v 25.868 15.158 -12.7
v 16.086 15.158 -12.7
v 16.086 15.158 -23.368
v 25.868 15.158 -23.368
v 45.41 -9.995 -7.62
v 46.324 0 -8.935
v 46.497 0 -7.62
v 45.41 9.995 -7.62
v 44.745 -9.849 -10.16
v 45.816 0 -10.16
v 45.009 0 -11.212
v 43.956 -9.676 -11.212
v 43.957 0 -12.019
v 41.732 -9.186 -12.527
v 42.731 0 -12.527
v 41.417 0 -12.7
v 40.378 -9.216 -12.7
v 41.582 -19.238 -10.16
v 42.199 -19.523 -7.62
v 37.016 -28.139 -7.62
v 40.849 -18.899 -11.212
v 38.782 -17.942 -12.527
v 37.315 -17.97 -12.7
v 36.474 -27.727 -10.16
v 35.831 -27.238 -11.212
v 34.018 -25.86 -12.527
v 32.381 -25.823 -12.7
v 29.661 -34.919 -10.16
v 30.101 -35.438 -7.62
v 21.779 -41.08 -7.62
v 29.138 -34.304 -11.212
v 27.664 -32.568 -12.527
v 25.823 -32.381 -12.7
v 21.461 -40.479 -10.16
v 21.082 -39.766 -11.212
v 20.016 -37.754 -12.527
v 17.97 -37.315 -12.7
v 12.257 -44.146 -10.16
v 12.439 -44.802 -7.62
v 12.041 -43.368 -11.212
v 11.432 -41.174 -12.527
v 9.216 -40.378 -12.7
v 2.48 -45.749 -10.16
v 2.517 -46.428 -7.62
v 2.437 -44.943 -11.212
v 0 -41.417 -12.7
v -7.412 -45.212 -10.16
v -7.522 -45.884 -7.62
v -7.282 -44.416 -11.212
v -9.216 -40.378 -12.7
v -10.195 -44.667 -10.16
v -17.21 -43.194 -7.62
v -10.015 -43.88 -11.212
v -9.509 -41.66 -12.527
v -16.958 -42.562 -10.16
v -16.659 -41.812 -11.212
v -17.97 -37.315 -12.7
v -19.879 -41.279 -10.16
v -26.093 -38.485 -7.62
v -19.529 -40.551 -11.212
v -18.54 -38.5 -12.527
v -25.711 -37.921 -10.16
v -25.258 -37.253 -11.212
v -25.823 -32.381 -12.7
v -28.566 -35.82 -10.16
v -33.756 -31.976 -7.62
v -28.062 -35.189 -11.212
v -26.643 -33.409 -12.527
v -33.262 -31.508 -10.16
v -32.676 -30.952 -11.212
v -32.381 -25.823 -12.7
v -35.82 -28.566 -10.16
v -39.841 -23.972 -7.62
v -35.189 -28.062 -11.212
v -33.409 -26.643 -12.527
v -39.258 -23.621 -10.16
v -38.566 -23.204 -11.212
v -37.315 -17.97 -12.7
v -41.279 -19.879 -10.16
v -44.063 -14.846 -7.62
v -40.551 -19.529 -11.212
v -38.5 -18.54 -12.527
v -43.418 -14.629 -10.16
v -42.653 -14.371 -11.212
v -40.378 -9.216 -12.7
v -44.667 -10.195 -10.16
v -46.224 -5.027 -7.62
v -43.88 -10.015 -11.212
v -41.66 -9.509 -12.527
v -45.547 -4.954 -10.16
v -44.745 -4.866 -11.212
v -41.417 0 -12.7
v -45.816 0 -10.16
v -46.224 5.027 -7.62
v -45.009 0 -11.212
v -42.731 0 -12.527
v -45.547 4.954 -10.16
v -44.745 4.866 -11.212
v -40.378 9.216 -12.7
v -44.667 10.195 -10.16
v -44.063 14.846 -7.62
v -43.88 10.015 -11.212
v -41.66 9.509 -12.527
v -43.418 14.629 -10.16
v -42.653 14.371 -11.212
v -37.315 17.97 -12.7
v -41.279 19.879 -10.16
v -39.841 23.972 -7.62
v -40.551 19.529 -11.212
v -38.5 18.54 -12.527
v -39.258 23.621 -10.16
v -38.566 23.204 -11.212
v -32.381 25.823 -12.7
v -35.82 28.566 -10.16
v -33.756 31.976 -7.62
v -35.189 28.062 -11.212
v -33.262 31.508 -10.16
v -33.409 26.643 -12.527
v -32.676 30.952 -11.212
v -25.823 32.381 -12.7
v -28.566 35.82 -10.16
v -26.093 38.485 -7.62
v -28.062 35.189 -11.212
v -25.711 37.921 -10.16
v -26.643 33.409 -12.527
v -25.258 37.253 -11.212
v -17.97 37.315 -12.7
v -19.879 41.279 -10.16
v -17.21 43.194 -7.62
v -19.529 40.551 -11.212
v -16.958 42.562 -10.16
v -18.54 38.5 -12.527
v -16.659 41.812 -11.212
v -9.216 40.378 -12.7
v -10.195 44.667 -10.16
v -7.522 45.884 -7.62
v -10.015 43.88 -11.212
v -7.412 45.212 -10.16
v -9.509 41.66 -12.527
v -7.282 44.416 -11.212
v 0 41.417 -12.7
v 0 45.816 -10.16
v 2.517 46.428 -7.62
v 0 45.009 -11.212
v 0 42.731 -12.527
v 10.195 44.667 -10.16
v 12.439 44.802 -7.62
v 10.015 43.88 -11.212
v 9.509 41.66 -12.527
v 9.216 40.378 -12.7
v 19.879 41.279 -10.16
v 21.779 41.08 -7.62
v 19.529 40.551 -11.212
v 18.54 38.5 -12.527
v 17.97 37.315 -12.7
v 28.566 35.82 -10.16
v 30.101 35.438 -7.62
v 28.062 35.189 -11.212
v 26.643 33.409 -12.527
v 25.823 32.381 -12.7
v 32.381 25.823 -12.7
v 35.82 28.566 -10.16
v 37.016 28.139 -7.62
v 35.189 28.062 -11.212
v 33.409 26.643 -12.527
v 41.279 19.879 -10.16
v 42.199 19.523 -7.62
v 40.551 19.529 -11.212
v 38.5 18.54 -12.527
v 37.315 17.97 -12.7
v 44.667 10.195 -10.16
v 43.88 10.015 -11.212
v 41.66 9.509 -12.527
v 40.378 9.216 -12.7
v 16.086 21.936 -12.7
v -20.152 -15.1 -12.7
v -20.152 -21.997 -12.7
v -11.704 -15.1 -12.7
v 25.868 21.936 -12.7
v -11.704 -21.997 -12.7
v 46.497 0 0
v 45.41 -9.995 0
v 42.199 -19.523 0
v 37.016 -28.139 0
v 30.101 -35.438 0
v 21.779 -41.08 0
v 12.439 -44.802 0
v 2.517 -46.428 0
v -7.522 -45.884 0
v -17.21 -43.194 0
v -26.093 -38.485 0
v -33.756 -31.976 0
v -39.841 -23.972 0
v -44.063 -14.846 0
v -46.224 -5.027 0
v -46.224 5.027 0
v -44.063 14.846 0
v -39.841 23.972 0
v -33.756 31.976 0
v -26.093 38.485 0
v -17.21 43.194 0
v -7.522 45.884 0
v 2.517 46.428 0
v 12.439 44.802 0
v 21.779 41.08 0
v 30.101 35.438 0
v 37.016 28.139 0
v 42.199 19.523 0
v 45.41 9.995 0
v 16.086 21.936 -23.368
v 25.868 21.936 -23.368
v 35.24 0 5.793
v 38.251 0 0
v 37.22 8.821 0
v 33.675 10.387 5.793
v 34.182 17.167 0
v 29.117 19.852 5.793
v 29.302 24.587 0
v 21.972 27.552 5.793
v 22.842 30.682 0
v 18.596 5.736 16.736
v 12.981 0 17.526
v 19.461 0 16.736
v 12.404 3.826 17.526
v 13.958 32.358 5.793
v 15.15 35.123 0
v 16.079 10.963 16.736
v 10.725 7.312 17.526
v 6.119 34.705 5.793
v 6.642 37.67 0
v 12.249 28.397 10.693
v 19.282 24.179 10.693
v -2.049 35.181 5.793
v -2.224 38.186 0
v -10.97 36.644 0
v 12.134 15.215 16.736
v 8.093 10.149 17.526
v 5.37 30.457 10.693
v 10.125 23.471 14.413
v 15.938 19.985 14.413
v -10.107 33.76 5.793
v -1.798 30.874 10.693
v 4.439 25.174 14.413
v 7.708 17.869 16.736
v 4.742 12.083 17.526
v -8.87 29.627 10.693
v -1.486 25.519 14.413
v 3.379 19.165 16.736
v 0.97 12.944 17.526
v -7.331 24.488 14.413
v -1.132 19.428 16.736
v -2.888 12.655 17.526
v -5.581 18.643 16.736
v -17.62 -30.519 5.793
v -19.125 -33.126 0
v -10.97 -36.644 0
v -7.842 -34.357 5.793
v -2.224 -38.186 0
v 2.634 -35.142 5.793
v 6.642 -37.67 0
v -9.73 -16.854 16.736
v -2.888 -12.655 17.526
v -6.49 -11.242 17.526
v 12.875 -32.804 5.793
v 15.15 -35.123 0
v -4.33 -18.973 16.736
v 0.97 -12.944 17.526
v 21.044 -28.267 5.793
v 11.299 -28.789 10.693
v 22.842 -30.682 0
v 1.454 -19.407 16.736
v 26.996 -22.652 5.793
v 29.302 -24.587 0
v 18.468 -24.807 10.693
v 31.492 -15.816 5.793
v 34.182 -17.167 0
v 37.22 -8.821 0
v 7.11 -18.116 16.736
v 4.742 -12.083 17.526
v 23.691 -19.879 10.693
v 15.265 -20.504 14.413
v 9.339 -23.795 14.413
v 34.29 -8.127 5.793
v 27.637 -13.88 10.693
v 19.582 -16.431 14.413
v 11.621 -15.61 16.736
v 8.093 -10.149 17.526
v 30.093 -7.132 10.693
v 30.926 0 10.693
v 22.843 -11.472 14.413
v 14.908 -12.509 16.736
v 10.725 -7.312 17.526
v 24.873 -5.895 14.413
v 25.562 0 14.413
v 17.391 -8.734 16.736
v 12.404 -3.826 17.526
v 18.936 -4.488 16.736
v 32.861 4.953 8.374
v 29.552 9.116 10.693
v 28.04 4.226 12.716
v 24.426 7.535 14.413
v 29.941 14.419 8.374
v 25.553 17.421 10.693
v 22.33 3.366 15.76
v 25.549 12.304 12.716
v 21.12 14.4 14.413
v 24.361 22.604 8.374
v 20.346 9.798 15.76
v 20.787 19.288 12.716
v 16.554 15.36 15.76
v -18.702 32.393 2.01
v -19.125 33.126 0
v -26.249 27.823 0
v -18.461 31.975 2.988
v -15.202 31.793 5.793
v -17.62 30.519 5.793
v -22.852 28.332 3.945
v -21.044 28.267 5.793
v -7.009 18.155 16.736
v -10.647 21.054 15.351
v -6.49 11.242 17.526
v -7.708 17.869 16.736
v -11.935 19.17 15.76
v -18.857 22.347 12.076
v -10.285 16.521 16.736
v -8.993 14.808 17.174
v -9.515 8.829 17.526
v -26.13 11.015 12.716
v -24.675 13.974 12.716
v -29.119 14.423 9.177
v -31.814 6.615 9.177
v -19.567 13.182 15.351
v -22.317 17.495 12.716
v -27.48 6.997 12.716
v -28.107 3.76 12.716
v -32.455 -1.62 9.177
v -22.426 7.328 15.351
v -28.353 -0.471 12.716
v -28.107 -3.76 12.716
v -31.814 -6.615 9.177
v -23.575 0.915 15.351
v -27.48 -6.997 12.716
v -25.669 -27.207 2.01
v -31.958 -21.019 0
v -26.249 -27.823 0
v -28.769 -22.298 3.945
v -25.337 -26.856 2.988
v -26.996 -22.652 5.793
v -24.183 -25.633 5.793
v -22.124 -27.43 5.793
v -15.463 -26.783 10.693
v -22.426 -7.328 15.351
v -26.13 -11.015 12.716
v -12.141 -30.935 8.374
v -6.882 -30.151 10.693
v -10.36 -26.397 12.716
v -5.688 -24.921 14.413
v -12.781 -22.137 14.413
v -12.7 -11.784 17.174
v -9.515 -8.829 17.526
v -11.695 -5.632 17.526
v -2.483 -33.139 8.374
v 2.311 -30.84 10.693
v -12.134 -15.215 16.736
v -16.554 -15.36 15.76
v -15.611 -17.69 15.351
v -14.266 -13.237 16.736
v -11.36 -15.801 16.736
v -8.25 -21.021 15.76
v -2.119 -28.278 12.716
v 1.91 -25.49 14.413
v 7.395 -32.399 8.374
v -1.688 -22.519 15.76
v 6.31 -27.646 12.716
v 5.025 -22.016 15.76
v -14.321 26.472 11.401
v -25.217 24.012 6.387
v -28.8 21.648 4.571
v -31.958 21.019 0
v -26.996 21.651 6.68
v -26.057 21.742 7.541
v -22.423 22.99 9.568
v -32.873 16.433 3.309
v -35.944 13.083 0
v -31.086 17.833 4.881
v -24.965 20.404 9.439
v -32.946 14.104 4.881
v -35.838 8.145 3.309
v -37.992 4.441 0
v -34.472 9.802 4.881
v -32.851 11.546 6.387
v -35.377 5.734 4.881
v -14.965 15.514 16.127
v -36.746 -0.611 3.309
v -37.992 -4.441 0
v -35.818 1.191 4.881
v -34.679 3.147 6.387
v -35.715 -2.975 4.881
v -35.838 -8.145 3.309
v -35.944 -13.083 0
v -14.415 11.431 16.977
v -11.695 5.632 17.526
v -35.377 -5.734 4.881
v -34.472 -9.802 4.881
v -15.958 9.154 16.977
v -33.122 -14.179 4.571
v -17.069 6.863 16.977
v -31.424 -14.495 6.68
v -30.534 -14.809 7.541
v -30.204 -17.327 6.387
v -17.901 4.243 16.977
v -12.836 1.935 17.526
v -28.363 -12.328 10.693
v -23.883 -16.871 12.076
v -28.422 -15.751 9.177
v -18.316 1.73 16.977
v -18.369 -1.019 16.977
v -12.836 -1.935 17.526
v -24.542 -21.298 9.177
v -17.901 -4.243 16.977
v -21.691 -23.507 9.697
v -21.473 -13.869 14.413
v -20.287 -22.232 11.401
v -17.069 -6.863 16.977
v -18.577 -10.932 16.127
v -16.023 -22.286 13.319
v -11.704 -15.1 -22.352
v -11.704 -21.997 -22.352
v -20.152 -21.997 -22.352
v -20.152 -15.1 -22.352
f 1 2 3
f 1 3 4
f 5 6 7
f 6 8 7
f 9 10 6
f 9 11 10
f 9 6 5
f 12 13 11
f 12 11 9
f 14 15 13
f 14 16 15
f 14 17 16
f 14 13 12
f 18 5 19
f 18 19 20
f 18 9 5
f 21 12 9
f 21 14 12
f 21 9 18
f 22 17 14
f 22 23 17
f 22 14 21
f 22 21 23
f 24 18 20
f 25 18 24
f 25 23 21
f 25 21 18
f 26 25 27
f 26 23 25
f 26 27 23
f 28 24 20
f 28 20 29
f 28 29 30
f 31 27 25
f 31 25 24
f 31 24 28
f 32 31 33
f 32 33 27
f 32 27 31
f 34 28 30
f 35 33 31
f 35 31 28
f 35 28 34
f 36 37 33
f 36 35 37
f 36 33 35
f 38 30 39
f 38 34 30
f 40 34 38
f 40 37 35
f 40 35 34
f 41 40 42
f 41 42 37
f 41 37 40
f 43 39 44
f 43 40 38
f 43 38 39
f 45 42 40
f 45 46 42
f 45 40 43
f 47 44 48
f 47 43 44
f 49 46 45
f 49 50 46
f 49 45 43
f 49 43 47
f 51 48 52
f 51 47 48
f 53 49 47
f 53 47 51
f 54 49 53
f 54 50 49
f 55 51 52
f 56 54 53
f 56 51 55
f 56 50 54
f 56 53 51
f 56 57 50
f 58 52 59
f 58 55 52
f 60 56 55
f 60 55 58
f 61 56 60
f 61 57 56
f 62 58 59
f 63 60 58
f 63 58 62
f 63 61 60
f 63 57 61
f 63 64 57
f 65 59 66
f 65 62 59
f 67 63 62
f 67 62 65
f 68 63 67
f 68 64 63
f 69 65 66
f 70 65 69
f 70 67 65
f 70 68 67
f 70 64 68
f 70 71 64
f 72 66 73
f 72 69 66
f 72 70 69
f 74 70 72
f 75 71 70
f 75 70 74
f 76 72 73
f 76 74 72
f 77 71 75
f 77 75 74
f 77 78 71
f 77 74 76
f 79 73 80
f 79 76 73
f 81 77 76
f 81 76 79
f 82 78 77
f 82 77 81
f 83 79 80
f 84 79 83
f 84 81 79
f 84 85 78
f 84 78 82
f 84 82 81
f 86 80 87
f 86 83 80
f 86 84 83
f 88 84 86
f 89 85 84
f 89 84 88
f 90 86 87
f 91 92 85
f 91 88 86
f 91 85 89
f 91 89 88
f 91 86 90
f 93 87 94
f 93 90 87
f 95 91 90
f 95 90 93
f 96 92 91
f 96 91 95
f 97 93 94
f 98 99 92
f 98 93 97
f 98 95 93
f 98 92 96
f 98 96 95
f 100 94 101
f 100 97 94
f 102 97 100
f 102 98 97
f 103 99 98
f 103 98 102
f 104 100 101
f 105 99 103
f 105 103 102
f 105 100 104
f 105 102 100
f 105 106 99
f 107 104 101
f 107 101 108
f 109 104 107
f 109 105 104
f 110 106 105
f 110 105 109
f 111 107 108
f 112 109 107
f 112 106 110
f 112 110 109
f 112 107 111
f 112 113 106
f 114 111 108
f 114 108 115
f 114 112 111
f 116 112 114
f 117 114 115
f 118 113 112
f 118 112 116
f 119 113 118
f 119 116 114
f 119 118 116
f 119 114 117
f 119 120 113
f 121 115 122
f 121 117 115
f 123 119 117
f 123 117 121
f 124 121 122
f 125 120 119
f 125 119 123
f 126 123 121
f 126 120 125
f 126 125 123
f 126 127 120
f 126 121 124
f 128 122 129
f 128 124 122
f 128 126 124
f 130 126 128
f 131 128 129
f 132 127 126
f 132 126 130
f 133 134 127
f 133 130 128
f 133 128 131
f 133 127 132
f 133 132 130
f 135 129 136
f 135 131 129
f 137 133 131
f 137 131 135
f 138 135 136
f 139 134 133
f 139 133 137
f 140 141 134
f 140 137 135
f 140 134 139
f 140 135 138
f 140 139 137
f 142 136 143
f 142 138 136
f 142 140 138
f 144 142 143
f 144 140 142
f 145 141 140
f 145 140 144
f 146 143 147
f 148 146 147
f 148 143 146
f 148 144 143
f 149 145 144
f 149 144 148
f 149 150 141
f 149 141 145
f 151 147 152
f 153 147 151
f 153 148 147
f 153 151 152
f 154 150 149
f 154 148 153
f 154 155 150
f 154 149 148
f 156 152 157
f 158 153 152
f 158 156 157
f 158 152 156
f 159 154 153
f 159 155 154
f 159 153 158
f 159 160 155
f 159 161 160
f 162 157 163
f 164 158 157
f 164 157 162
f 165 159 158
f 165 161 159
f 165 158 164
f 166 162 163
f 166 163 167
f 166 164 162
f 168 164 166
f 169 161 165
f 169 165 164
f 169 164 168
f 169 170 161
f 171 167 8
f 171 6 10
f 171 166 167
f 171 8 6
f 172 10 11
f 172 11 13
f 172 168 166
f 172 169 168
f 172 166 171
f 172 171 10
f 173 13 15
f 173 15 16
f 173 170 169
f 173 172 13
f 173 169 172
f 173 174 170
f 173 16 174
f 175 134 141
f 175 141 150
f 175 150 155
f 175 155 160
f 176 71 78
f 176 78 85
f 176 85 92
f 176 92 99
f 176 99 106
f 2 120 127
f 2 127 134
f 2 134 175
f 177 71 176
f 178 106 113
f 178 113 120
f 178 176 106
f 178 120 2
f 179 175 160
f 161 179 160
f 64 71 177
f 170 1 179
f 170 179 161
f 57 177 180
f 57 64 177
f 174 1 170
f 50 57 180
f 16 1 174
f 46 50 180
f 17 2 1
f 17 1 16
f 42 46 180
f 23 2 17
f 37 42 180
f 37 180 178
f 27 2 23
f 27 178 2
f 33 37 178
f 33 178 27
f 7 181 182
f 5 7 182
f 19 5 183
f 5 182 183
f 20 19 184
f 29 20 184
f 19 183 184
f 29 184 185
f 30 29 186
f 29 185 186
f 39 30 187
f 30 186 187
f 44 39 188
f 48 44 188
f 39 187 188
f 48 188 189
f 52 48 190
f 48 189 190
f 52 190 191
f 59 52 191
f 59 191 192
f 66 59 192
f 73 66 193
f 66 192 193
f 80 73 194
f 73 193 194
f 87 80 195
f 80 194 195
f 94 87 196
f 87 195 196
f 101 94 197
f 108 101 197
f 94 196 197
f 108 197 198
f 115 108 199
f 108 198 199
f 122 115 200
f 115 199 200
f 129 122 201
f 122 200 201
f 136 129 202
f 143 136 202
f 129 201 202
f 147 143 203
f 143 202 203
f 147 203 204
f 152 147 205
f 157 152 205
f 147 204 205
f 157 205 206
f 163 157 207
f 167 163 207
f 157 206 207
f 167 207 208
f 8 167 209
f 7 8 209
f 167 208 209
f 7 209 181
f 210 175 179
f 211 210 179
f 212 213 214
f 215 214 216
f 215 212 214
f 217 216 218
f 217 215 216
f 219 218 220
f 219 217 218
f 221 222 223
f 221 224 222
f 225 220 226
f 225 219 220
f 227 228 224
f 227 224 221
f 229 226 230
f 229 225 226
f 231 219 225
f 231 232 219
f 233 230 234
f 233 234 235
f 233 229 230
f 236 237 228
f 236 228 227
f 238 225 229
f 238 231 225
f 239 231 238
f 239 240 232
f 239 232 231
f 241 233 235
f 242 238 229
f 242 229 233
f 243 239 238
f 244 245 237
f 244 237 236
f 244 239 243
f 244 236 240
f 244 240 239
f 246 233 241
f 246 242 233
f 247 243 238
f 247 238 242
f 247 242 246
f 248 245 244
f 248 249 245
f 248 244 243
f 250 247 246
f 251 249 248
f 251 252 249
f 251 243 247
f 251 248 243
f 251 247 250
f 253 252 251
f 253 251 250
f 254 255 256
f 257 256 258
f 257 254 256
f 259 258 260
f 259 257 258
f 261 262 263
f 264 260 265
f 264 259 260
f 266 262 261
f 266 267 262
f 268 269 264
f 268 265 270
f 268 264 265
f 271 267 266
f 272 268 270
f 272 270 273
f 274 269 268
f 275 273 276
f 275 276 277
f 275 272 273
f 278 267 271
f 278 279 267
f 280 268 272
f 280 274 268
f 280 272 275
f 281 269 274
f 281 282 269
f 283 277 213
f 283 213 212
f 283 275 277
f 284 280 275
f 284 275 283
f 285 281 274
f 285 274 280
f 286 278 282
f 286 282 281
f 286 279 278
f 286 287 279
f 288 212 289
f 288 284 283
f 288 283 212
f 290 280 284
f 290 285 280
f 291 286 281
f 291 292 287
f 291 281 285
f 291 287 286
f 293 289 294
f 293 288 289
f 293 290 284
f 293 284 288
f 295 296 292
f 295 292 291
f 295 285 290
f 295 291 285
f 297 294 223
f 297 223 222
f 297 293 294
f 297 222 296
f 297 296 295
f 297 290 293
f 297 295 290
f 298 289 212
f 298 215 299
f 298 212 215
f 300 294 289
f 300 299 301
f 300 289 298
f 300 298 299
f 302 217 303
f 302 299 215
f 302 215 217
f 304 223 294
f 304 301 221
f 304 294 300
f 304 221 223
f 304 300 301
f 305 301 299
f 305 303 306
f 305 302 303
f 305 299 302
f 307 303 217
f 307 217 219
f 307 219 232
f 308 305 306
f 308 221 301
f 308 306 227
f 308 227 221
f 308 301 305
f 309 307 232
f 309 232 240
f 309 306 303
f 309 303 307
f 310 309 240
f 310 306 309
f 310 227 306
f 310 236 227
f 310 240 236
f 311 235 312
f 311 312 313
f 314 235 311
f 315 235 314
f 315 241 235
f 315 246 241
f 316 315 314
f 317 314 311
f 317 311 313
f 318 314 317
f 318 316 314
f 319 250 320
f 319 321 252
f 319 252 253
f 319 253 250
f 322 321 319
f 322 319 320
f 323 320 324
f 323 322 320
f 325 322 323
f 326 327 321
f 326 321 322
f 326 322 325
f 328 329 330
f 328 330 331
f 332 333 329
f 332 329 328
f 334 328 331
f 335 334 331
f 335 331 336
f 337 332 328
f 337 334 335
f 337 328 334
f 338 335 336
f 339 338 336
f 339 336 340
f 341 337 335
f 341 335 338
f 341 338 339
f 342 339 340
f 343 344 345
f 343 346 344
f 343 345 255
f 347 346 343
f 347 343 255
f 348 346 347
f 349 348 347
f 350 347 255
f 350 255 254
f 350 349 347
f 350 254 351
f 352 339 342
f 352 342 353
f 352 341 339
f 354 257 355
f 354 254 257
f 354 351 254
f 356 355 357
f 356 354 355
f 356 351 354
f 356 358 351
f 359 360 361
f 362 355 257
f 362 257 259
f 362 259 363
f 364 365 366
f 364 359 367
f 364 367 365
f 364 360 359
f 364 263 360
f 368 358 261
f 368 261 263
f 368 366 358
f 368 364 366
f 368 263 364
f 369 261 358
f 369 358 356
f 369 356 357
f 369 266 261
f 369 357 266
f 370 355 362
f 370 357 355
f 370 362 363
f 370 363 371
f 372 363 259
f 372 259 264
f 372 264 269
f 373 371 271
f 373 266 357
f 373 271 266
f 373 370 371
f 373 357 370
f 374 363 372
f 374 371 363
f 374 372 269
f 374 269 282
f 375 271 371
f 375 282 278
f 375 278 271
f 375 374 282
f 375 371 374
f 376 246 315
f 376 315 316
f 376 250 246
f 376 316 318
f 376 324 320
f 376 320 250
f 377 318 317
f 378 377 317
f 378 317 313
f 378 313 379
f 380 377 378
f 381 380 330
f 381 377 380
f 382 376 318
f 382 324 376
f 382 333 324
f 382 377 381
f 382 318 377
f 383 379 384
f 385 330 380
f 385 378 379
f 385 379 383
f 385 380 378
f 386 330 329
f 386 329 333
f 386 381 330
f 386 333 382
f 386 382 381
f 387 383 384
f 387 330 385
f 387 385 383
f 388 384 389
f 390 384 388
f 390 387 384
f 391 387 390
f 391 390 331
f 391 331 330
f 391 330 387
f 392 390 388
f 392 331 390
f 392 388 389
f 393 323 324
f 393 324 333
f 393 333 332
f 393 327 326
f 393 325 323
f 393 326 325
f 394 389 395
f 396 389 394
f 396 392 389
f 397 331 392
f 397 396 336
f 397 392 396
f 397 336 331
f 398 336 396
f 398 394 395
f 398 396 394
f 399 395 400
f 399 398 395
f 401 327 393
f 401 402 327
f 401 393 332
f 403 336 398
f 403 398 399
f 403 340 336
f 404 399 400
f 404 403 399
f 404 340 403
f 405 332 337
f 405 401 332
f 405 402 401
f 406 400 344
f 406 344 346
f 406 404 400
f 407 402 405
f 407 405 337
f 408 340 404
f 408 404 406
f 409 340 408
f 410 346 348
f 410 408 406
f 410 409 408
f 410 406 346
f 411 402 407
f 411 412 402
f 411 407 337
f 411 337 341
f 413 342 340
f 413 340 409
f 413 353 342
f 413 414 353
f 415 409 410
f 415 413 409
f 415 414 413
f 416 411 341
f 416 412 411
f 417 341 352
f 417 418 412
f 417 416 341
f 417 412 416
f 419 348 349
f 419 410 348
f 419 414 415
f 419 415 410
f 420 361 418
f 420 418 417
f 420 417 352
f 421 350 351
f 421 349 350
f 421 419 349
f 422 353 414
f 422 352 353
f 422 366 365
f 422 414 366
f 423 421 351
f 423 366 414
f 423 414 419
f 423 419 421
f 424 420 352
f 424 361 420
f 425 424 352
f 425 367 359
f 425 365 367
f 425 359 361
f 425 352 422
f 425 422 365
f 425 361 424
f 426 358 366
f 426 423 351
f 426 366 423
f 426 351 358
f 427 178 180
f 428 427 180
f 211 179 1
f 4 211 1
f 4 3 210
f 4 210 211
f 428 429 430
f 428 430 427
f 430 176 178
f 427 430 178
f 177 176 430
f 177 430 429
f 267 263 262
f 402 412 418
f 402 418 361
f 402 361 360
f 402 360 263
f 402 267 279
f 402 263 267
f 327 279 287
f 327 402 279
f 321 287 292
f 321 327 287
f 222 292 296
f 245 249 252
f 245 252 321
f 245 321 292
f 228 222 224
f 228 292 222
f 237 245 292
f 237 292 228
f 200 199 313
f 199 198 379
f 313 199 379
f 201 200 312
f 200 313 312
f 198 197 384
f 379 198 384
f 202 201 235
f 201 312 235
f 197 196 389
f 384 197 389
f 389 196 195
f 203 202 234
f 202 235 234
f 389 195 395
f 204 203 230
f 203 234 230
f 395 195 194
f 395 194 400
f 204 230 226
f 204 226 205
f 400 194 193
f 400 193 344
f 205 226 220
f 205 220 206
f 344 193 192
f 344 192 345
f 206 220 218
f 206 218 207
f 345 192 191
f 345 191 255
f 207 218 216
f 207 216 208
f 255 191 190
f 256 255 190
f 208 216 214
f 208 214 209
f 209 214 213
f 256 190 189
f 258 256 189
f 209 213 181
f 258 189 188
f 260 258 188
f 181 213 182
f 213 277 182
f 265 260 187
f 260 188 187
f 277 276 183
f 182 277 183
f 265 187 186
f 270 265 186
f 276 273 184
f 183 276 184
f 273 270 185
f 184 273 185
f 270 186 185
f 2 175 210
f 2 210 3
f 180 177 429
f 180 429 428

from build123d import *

# Parameters (mm, degrees)
F0_R     = 38.2508515855
F1_DEPTH = 17.526
F3_R     = 46.4966196034
F4_DEPTH = 12.7
F5_R     = 5.08
F6_W     = 8.4483027458
F6_H     = 6.8974085152
F8_DEPTH = 9.652
F7_W     = 9.7811389714
F7_H     = 6.7780073732
F9_DEPTH = 10.668


# Not quite as in the source:
# - a fillet or chamfer that OpenCascade refuses, or shapes differently, is made with other operations: its cross-section is extruded or revolved along the edge and cut away or added


with BuildPart() as f1:
    # F0 (on Top) → F1 (new body)
    with BuildSketch(Plane.XY):
        Circle(F0_R)
    extrude(amount=F1_DEPTH)

    # F2: fillet of radius 26.9812507731 on 1 edges, made by hand

    # F2_s1 → F2_t2 (revolve, cut)
    with BuildSketch(Plane.XZ):
        with BuildLine():
            ThreePointArc((38.2508515855, 0), (28.3570882092, 12.7157030349), (12.9805898912, 17.526))
            Line((12.9805898912, 17.526), (38.2508515855, 17.526))
            Line((38.2508515855, 17.526), (38.2508515855, 0))
        make_face()
    revolve(axis=Axis((0, 0, 17.526), (0, 0, 1)), mode=Mode.SUBTRACT)

    # F3 (on face) → F4 (join)
    with BuildSketch(Plane(origin=(0, 0, 0), x_dir=(1, 0, 0), z_dir=(0, 0, -1))):
        Circle(F3_R)
    extrude(amount=F4_DEPTH)

    # F5
    f5_edges = [f1.edges().sort_by_distance(p)[0] for p in [
        (-46.49662, 0, -12.7),
    ]]
    fillet(f5_edges, radius=F5_R)

    # F6 (on face) → F8 (join)
    with BuildSketch(Plane(origin=(0, 0, -12.7), x_dir=(1, 0, 0), z_dir=(0, 0, -1))):
        with Locations((-15.9282591194, 18.548514694)):
            Rectangle(F6_W, F6_H)
    extrude(amount=F8_DEPTH)

    # F7 (on face) → F9 (join)
    with BuildSketch(Plane(origin=(0, 0, -12.7), x_dir=(1, 0, 0), z_dir=(0, 0, -1))):
        with Locations((20.9769504145, -18.5471354052)):
            Rectangle(F7_W, F7_H)
    extrude(amount=F9_DEPTH)


solid = f1.part
